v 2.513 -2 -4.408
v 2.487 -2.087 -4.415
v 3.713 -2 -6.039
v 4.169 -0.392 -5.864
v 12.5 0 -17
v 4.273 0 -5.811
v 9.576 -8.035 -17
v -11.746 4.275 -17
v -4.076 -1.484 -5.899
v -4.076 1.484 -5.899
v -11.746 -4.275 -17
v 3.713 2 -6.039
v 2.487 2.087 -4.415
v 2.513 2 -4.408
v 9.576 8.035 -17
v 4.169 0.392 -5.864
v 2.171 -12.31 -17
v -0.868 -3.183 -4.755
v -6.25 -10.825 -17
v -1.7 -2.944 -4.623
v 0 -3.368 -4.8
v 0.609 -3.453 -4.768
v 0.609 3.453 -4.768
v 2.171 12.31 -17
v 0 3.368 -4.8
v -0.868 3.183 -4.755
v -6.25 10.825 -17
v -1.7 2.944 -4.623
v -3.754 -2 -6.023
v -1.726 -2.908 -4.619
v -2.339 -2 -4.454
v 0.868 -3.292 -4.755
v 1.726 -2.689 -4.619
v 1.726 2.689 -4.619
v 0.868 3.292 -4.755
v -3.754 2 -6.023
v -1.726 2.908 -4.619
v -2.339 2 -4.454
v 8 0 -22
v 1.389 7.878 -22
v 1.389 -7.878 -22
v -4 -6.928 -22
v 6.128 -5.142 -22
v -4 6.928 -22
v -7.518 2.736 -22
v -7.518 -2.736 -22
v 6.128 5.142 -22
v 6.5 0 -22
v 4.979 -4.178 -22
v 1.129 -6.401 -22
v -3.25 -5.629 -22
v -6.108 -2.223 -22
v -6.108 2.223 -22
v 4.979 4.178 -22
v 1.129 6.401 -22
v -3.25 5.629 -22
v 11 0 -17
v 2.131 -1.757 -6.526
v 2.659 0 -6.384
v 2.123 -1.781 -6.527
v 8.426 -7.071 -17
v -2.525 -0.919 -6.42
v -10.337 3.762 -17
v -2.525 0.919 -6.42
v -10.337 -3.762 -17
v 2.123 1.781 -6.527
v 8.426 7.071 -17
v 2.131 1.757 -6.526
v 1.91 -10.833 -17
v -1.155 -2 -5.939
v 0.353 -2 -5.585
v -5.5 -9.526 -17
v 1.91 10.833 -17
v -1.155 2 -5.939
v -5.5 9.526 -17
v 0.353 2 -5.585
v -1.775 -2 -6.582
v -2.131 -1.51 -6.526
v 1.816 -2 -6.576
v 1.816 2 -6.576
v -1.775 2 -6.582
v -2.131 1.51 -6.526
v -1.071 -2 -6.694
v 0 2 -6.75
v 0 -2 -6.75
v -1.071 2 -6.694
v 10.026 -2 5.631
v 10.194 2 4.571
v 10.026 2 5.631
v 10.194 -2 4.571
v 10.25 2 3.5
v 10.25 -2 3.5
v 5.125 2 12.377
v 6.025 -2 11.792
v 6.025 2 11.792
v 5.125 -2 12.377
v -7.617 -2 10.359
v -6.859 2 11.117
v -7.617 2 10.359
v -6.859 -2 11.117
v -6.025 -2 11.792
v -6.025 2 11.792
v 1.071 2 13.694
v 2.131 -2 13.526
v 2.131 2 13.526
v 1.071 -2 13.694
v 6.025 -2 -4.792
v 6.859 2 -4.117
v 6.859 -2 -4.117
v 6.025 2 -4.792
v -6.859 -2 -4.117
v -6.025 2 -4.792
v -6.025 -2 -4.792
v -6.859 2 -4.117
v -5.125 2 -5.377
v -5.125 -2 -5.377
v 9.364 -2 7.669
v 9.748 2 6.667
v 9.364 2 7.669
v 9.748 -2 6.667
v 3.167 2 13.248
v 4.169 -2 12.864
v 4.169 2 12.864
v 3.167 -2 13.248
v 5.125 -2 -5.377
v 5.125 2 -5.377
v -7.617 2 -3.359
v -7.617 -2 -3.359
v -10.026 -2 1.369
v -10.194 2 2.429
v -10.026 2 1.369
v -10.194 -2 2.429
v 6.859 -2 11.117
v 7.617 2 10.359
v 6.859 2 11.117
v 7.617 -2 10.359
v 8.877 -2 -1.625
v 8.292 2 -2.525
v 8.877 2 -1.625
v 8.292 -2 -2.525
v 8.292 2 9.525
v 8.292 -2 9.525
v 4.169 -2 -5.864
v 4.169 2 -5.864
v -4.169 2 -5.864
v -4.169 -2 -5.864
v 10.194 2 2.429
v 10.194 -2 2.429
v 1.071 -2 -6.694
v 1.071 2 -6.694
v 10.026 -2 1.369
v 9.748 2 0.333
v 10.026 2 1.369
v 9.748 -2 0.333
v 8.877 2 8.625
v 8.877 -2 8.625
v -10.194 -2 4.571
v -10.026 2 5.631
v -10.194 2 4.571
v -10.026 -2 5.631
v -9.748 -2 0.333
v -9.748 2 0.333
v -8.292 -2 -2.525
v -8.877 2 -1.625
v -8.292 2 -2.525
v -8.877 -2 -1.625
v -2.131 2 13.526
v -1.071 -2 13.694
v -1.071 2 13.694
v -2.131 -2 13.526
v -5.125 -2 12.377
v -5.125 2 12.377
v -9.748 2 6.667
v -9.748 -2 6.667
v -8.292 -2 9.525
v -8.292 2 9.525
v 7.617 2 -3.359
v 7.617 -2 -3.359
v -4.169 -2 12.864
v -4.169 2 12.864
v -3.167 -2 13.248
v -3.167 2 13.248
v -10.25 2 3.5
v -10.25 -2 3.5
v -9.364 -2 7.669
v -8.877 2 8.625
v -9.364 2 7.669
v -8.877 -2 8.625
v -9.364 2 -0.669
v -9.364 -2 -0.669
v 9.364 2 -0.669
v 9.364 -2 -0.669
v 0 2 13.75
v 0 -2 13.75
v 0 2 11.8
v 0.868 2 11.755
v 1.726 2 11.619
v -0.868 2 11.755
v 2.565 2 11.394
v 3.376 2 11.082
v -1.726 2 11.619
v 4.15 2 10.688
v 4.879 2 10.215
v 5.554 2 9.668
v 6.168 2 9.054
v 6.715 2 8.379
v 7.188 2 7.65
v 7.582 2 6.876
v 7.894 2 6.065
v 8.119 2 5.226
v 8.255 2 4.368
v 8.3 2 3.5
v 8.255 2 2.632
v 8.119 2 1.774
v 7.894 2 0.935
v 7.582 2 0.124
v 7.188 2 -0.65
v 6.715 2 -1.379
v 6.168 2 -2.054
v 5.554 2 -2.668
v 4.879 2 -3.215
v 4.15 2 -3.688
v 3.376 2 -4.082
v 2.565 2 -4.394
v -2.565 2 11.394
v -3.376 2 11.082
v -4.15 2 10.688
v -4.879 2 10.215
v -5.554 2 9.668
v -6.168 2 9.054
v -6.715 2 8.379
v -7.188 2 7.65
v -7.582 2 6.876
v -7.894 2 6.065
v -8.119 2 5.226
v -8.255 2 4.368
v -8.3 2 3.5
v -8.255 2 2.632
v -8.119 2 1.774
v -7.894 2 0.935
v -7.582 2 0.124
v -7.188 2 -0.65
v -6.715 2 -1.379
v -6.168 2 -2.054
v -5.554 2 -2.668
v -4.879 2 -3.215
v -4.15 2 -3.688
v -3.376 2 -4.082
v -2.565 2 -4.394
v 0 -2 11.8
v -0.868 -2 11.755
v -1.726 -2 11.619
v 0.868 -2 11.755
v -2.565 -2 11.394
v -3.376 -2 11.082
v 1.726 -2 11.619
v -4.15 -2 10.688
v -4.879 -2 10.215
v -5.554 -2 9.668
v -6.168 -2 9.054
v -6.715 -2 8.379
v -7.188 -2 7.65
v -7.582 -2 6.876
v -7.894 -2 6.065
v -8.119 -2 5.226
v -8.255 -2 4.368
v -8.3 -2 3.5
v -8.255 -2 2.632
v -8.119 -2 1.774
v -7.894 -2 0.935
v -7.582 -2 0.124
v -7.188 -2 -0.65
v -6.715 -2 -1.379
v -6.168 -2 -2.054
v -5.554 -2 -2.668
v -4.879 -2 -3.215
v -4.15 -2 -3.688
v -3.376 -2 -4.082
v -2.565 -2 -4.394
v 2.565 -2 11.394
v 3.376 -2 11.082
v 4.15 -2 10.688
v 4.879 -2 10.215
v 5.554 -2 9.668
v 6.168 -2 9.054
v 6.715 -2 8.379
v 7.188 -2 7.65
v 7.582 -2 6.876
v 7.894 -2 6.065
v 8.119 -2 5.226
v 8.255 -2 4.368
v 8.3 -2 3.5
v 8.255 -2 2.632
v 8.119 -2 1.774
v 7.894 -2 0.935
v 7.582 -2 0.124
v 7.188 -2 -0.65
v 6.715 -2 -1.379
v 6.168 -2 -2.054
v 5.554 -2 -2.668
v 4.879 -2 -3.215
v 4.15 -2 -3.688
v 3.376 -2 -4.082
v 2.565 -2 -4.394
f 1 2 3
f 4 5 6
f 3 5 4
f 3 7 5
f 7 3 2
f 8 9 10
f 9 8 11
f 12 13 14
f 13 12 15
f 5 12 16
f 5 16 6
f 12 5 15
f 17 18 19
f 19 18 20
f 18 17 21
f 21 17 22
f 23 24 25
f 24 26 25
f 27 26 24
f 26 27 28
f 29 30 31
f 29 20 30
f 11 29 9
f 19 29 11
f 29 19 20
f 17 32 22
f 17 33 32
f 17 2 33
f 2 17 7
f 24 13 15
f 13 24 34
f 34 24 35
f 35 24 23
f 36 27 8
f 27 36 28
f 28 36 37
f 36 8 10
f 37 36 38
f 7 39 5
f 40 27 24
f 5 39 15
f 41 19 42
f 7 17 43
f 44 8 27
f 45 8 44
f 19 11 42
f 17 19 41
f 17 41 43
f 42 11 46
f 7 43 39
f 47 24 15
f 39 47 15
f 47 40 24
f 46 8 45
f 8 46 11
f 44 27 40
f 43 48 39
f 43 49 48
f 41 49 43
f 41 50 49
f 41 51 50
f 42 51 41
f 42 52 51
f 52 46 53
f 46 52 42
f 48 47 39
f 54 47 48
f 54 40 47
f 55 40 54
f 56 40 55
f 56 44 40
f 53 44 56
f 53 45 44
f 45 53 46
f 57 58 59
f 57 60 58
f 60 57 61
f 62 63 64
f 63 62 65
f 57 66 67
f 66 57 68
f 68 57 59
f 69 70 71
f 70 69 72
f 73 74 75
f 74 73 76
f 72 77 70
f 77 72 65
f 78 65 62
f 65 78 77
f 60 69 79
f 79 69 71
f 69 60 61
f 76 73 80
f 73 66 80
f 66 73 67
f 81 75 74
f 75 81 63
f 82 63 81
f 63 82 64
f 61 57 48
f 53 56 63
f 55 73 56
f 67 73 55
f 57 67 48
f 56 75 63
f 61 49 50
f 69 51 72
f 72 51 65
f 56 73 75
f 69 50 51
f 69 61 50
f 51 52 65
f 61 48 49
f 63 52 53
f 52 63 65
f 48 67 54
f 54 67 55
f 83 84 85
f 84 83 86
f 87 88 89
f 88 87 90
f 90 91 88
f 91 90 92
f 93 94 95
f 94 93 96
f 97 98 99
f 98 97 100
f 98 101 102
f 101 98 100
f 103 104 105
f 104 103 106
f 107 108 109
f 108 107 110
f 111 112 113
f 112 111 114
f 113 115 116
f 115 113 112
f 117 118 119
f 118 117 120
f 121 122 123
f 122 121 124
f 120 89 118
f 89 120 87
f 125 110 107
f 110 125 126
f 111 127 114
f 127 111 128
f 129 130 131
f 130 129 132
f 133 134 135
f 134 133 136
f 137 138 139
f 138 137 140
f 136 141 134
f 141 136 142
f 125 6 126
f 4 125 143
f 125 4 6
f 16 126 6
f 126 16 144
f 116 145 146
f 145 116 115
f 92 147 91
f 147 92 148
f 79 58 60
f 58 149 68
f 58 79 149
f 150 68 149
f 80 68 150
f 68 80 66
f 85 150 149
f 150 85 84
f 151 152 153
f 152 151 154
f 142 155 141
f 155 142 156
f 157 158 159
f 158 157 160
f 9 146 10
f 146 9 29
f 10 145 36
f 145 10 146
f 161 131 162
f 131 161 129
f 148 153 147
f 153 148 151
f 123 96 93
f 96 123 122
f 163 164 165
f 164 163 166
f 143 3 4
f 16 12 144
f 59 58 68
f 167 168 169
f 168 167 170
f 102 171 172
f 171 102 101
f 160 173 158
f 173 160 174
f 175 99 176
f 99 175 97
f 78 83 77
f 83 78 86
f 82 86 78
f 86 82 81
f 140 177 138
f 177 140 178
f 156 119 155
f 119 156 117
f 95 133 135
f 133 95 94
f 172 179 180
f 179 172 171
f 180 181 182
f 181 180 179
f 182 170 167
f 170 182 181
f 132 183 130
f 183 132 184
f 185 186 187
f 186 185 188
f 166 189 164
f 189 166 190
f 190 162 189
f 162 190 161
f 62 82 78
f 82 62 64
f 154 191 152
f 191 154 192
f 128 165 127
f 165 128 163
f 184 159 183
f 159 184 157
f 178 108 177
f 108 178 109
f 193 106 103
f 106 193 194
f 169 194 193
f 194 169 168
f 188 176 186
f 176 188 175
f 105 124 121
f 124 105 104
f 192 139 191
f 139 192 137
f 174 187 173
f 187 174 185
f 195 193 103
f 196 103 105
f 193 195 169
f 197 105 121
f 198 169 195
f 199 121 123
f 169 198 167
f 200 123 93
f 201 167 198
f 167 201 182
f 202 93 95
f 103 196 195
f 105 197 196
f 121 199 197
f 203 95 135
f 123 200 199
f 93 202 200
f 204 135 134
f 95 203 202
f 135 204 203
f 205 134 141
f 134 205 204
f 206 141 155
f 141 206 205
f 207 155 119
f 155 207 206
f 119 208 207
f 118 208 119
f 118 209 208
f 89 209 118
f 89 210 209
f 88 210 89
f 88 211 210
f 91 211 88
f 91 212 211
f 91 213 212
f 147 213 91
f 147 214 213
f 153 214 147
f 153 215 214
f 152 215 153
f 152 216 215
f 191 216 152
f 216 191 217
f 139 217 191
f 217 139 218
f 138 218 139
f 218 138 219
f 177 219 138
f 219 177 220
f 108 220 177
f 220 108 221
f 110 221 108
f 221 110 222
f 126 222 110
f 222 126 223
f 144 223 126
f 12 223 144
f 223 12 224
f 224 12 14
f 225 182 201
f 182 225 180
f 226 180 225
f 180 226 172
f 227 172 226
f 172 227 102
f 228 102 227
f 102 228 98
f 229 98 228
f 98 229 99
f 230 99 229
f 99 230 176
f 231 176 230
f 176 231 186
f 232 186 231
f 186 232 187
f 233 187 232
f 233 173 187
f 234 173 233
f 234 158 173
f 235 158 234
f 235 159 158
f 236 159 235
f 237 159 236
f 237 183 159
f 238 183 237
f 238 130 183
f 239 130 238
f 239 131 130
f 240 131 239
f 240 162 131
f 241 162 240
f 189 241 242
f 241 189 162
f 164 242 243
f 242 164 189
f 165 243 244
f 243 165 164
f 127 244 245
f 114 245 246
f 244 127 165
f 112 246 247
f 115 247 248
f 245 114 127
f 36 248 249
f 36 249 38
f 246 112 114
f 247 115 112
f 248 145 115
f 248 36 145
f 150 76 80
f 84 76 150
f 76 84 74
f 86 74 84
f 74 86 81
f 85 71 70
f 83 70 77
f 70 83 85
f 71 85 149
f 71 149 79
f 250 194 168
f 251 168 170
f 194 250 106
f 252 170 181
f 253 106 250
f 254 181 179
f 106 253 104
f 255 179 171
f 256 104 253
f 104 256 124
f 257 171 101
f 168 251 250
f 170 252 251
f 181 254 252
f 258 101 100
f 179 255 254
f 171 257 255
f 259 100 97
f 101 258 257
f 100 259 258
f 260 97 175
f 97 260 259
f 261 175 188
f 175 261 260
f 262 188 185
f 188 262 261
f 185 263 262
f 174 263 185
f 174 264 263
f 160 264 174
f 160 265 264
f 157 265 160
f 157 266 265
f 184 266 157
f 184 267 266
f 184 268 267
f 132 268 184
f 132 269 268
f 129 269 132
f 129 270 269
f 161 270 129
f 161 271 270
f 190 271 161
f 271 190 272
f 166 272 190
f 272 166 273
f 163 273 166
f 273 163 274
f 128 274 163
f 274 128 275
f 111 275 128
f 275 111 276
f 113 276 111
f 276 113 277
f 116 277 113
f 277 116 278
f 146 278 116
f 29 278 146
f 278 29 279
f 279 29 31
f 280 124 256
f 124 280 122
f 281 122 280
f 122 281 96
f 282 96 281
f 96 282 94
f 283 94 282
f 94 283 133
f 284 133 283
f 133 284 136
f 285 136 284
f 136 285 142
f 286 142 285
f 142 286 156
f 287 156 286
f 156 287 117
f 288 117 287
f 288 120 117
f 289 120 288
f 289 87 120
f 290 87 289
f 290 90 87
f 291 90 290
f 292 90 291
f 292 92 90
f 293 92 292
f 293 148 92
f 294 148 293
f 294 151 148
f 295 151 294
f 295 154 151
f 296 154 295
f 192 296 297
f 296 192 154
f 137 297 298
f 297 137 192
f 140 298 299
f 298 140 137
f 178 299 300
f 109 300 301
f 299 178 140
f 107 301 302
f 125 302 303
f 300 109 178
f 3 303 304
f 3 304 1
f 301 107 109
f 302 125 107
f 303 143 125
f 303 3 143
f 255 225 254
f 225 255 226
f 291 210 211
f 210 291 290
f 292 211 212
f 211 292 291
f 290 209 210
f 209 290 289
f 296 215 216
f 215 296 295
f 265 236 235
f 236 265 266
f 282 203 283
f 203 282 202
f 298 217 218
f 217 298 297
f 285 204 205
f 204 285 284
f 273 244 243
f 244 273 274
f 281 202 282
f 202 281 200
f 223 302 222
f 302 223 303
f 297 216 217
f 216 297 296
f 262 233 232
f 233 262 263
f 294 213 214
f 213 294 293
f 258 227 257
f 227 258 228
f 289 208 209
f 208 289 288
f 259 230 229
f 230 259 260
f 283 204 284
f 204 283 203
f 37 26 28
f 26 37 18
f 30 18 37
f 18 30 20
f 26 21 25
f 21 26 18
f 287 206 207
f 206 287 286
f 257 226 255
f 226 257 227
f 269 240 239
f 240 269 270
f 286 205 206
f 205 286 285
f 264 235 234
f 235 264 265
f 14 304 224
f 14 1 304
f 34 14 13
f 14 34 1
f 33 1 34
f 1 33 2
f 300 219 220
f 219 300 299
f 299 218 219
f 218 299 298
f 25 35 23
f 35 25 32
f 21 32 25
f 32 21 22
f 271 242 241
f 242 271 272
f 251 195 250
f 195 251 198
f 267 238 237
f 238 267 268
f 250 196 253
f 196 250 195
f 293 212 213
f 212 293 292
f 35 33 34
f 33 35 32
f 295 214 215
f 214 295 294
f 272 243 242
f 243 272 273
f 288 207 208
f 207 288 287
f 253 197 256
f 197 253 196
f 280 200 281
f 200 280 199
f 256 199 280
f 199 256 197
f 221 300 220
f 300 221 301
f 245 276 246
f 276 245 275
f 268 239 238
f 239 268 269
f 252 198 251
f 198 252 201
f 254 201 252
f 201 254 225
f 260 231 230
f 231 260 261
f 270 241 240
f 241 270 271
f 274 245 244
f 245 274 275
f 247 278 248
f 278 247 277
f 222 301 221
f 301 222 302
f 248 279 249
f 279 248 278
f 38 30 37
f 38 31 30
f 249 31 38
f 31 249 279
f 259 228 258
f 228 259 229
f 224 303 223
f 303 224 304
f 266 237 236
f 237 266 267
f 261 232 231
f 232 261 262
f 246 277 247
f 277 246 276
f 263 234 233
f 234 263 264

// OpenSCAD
// file: diamond.scad
$fn=30;

module diamond(w, w2, h1, h2) {
    $fn=9;
    cylinder(d1=0, d2=w, h=h1);
    translate([0, 0, h1]) cylinder(d1=w, d2=w2, h=h2);
}

module dvase(w, w2, h1, h2) {
    difference() {
            diamond(w, w2, h1, h2);
            translate([0, 0, 3]) diamond(w-3, w2-3, h1-3, h2);
            translate([0, 0, h1-.1]) cylinder(d=w2-4, h=h2+1);
    }
}

rotate([180, 0, 0]) dvase(50, 32, 35, 10);
// main file
use <diamond.scad>;

$fn=60;

difference() {
    union() {
        rotate([180, 0, 0]) dvase(25, 16, 17, 5);
        translate([0, 0, 3.5]) rotate([90, 0, 0])cylinder(d=20.5, h=4, center=true);
    }
    translate([0, 0, 3.5]) rotate([90, 0, 0]) cylinder(d=16.6, h=25, center=true);
}
